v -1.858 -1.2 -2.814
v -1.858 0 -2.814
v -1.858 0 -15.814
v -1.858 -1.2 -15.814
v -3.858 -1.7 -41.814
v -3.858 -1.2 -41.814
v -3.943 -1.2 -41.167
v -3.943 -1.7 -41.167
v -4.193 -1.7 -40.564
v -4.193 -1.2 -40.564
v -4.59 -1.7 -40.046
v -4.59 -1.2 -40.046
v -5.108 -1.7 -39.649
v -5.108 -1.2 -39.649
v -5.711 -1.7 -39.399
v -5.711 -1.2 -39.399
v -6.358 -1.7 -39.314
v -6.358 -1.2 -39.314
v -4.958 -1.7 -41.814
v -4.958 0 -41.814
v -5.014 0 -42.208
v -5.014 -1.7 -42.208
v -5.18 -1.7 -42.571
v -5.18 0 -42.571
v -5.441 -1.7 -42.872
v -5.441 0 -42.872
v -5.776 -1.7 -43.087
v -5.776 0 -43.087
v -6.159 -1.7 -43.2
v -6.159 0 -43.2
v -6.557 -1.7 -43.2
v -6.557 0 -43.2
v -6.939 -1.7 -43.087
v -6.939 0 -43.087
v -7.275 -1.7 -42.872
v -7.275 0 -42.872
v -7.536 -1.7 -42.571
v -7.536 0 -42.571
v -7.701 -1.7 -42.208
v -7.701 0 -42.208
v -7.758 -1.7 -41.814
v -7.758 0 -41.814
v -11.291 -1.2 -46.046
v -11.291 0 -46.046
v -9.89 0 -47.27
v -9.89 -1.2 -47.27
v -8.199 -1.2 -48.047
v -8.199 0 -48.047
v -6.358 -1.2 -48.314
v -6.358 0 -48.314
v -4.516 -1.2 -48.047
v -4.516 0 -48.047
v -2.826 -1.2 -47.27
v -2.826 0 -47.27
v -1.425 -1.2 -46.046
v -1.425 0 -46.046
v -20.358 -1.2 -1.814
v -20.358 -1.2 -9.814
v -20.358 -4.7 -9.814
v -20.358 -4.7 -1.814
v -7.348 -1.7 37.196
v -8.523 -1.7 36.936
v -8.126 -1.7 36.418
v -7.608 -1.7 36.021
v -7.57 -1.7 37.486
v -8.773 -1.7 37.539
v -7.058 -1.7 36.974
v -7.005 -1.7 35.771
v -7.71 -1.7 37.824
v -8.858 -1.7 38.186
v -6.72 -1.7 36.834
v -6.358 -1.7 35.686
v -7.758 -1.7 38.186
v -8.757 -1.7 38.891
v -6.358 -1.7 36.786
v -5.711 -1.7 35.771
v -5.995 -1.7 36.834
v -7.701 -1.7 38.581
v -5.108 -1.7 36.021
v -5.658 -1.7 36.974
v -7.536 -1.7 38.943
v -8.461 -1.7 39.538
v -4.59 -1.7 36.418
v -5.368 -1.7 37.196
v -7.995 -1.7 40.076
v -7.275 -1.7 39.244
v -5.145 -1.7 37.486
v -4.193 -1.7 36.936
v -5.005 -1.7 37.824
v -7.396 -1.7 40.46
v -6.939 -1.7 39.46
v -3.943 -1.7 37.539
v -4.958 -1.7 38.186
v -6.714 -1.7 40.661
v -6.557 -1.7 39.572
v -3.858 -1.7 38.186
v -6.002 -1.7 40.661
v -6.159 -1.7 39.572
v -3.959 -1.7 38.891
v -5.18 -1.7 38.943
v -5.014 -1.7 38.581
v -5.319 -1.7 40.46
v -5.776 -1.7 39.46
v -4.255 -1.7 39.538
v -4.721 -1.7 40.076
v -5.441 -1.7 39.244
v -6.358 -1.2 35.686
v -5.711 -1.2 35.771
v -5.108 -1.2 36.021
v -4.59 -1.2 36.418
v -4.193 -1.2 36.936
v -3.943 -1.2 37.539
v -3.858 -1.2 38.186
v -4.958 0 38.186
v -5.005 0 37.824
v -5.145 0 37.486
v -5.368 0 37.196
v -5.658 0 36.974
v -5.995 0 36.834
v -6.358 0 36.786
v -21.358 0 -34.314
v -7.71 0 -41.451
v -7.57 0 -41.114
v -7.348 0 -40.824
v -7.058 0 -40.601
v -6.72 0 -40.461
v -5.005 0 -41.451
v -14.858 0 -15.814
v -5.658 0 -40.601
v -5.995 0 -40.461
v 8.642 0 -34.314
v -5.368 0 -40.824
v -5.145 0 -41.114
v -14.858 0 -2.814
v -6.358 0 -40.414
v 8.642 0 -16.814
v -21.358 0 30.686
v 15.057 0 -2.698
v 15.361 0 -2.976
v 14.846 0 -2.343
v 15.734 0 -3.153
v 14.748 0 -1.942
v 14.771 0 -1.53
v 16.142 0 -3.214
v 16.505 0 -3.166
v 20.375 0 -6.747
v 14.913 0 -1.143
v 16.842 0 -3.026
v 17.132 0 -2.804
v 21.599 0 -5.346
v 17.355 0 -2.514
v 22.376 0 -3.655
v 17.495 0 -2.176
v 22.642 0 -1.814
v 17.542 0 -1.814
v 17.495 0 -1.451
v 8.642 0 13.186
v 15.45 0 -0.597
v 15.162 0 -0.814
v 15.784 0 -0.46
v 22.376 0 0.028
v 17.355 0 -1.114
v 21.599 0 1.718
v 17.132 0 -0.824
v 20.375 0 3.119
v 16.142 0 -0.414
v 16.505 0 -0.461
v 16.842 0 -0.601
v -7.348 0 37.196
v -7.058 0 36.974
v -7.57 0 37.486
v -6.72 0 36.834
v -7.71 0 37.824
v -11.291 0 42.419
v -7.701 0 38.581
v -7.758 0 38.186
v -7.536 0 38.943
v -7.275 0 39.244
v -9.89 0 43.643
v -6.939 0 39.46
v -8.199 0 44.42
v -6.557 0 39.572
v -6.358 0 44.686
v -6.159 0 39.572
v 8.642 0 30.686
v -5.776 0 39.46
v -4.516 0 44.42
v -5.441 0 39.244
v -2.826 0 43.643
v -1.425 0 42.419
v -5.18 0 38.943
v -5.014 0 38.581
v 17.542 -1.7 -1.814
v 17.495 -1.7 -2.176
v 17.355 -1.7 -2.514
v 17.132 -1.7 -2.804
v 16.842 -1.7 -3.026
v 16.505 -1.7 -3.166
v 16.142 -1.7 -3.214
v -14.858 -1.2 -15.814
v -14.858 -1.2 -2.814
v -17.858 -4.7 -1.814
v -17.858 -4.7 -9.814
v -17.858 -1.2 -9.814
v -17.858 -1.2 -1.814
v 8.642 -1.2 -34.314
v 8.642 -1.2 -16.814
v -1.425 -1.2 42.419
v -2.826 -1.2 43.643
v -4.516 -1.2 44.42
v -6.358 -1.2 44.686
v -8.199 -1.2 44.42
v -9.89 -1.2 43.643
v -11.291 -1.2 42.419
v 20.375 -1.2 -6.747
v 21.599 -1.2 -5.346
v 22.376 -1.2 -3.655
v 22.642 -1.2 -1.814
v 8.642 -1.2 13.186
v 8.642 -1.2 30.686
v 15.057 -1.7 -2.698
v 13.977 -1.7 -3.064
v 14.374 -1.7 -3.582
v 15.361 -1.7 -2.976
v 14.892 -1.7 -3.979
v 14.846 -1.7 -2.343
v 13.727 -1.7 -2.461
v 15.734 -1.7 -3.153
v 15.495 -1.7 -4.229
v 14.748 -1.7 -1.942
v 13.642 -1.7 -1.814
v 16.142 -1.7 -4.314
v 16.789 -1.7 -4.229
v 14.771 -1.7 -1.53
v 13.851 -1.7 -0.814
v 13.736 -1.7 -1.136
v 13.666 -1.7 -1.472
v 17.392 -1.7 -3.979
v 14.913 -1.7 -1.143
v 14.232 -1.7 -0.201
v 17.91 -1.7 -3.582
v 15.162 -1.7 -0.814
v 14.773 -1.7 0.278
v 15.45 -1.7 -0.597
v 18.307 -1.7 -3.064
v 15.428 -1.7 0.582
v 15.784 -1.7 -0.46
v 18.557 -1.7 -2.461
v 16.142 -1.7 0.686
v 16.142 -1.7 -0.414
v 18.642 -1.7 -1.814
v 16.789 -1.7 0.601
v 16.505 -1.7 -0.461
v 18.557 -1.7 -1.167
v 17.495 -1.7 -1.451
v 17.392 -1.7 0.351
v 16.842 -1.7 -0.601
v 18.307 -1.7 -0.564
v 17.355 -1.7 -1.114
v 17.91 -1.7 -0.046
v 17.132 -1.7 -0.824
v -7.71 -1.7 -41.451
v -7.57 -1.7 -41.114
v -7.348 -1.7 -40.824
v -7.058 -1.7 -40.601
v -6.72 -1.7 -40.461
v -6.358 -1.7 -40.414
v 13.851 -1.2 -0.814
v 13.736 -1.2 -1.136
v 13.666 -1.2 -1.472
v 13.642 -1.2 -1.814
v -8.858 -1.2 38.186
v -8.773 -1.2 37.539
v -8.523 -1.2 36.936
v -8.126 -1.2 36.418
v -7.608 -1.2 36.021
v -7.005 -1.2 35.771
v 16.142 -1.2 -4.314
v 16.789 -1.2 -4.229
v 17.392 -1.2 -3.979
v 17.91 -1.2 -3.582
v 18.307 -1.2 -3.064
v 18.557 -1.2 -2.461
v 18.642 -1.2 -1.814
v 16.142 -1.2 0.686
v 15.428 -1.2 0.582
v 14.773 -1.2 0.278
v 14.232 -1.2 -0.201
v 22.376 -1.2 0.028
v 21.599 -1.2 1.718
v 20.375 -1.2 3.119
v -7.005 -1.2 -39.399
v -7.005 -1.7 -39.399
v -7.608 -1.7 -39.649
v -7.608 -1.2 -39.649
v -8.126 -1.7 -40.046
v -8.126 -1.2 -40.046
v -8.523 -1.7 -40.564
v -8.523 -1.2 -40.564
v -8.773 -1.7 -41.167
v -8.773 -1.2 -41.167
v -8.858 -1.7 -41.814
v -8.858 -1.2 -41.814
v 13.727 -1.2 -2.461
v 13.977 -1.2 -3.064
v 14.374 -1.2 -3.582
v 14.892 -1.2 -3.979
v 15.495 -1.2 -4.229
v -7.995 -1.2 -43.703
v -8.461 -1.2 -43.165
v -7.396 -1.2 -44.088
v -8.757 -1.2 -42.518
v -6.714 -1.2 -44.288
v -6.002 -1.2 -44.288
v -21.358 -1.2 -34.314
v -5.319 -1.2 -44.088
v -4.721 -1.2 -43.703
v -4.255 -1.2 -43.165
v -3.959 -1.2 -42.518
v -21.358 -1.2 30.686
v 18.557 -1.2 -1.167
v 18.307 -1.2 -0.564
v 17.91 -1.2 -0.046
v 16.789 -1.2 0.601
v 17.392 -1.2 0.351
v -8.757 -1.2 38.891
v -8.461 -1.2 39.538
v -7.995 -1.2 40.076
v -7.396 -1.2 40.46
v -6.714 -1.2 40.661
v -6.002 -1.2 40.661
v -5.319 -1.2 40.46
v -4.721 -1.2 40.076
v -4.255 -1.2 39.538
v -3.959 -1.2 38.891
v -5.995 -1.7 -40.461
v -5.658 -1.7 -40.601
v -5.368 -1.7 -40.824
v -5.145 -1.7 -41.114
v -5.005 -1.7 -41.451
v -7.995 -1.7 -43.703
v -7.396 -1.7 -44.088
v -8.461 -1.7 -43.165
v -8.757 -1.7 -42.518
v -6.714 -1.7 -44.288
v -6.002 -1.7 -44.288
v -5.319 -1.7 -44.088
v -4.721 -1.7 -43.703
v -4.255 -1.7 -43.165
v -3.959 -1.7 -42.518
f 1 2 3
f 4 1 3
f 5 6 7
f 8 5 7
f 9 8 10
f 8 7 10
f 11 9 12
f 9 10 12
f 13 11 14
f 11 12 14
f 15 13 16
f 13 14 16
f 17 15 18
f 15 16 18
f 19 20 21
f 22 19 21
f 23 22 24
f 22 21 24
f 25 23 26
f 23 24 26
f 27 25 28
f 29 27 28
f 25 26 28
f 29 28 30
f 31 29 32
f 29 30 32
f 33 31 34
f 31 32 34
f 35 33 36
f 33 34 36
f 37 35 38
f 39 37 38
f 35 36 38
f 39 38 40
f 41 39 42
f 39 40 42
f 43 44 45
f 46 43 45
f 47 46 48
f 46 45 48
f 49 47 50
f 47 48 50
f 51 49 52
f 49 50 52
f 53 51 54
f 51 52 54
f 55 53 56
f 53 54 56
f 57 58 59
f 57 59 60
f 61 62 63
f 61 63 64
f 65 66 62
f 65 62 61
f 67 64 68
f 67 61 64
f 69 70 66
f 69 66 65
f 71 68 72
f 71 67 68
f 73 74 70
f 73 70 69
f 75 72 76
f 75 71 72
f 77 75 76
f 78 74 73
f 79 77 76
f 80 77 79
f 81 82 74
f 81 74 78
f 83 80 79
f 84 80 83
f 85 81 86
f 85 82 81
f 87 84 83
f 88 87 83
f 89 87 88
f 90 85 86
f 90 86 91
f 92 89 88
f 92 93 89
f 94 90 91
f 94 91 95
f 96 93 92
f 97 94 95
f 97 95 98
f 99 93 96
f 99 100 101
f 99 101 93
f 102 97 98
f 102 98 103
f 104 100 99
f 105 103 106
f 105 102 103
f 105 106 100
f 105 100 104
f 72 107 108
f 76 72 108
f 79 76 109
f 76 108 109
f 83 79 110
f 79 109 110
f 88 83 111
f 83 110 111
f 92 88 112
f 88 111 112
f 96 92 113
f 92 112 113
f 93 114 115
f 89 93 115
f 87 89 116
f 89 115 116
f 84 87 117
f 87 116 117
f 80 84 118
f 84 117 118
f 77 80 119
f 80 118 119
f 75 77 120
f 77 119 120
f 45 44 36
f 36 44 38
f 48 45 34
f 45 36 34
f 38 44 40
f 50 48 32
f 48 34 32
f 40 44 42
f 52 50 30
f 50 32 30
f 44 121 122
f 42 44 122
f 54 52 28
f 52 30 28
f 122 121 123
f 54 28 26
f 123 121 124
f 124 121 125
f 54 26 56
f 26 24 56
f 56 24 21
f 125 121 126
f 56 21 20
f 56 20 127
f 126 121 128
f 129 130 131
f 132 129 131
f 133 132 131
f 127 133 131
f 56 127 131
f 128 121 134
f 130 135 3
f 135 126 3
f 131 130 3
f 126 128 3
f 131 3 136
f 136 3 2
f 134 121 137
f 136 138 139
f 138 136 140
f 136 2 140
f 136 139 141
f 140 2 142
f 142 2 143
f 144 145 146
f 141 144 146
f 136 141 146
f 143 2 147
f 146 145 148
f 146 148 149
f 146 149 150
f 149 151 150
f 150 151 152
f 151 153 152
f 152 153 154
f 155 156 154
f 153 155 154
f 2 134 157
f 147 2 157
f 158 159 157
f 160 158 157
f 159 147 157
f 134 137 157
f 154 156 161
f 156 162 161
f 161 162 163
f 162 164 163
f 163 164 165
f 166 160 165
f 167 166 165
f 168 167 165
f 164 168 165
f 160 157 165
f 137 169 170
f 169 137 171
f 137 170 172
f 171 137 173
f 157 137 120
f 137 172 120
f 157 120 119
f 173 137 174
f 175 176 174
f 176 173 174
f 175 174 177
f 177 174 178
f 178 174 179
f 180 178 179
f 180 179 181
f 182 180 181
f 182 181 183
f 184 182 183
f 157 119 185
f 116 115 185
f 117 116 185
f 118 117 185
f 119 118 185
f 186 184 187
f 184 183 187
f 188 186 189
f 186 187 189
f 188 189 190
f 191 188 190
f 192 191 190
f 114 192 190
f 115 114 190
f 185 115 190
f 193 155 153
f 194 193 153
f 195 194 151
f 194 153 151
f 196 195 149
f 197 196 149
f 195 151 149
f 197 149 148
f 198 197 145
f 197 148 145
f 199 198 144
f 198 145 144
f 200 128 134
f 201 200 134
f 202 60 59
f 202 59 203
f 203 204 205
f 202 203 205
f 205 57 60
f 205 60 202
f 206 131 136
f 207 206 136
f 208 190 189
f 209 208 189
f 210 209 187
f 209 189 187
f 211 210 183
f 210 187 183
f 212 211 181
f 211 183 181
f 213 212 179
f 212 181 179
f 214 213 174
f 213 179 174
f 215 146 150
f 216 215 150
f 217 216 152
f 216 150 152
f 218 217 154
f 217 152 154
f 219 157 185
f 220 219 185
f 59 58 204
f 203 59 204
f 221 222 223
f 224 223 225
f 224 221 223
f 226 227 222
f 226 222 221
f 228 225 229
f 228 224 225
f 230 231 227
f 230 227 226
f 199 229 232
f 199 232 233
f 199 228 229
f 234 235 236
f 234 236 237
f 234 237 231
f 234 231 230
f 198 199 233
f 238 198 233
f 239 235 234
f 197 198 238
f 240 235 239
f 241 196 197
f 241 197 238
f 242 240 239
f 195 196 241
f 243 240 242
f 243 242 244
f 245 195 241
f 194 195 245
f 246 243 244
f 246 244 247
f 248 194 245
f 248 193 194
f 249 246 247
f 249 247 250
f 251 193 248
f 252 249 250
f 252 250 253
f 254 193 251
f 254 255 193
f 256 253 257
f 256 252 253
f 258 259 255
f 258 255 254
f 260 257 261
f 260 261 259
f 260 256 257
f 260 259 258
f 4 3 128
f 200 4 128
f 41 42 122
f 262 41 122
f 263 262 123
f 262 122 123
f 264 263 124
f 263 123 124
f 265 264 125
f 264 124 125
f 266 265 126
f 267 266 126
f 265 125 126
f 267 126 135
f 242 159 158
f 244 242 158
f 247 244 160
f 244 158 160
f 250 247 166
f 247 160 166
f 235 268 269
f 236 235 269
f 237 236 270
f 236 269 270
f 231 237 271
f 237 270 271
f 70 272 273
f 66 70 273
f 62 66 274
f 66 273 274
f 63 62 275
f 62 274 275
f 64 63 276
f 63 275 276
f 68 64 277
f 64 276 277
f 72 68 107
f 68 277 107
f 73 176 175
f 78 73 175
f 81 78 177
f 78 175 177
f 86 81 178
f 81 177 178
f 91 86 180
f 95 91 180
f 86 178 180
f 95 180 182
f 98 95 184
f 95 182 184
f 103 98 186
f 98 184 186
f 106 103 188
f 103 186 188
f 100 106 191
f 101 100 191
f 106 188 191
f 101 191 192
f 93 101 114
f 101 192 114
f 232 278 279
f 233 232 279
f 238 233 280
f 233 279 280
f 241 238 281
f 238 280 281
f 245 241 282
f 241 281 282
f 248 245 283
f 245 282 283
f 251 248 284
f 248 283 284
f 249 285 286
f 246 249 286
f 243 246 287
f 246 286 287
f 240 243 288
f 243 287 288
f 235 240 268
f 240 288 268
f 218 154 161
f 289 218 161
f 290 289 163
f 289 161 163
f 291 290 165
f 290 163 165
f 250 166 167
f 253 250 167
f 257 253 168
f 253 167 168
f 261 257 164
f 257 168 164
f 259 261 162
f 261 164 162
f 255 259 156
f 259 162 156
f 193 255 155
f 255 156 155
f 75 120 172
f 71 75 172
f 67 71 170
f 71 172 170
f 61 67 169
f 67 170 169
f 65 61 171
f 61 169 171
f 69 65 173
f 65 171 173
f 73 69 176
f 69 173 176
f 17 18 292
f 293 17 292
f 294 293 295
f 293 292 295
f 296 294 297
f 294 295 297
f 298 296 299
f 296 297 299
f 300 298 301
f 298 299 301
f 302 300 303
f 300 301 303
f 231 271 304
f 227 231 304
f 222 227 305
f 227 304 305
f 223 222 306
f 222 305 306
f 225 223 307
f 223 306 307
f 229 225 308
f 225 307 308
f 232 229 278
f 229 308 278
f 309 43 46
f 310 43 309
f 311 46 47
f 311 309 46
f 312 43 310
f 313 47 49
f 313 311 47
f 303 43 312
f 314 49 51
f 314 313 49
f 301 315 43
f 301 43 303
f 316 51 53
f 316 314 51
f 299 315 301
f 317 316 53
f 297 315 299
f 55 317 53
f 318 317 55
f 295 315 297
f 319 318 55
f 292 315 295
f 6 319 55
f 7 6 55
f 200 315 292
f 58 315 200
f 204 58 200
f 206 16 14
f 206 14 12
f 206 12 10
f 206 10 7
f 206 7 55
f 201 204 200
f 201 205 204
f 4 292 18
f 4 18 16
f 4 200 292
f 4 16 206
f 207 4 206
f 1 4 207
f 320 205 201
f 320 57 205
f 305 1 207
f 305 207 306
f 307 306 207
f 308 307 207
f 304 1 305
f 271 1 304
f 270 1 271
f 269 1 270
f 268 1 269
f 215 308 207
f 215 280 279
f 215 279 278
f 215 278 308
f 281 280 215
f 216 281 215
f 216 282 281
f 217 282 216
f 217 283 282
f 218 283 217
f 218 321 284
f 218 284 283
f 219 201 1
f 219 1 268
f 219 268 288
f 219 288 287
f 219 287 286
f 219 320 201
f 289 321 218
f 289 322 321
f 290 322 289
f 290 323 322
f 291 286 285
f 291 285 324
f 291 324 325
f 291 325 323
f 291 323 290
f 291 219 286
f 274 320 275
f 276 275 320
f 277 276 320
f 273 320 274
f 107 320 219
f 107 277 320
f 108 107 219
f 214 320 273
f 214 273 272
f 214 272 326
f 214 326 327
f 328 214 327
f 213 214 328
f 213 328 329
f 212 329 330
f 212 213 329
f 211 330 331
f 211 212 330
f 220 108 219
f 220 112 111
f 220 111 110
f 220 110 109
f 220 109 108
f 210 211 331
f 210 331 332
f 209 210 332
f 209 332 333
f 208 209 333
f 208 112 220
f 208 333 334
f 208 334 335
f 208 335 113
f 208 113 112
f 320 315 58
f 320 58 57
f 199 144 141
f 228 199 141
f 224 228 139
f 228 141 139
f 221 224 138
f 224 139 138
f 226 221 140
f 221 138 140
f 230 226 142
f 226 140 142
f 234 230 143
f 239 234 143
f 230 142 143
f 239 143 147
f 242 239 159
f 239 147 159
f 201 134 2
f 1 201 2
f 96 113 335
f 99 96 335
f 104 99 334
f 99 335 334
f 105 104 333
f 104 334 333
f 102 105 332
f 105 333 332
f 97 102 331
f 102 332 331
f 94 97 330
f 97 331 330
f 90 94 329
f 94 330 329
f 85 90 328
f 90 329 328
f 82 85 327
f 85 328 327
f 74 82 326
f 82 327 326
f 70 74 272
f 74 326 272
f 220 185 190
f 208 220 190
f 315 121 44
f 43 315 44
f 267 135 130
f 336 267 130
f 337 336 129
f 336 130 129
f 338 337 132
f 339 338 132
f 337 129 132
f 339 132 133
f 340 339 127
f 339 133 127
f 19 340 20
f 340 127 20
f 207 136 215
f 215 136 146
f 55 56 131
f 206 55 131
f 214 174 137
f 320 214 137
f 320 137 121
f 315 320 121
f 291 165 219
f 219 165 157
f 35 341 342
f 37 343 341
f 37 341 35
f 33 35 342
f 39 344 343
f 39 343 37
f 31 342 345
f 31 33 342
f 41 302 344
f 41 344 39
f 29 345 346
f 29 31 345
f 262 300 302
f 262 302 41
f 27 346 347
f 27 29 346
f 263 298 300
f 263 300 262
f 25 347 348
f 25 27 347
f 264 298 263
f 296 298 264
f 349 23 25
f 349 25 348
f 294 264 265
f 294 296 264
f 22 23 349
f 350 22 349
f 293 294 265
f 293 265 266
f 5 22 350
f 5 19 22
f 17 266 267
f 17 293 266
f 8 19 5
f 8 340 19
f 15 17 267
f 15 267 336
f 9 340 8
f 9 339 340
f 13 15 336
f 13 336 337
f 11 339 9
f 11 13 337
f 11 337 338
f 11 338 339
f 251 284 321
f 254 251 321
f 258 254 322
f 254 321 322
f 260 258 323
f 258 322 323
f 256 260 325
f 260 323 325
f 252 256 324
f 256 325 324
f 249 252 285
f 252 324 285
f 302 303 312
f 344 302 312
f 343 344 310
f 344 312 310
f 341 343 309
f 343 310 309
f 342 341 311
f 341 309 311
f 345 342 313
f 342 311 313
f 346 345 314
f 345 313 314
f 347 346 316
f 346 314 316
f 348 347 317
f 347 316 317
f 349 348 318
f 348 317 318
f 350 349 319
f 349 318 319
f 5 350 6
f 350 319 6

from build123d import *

# Parameters (mm, degrees)
F1_DEPTH = 1.2
F2_DEPTH = 1.7
F0_W     = 2.5
F0_H     = 8
F3_DEPTH = 4.7


with BuildPart() as f1:
    # F0 (on Front) → F1 (new body)
    with BuildSketch(Plane.XZ):
        Polygon((-6.3577895987, -1.8137509867), (-6.3577895987, 30.6862490133), (-12.8577895987, 30.6862490133), (-21.3577895987, 30.6862490133), (-21.3577895987, -1.8137509867), (-20.3577895987, -1.8137509867), (-17.8577895987, -1.8137509867), align=None)
        Polygon((0.1422104013, 30.6862490133), (-6.3577895987, 30.6862490133), (-6.3577895987, -1.8137509867), (8.6422104013, -1.8137509867), (8.6422104013, -0.8137509867), (8.6422104013, 4.6862490133), (8.6422104013, 13.1862490133), (8.6422104013, 30.6862490133), align=None)
        with BuildLine():
            Line((-21.3577895987, 30.6862490133), (-12.8577895987, 30.6862490133))
            Line((-12.8577895987, 30.6862490133), (-12.8577895987, 38.1862490133))
            ThreePointArc((-12.8577895987, 38.1862490133), (-12.4534647314, 40.4429600442), (-11.2907912366, 42.4189189557))
            Line((-11.2907912366, 42.4189189557), (-21.3577895987, 30.6862490133))
        make_face()
        with BuildLine():
            Line((0.1422104013, 38.1862490133), (0.1422104013, 30.6862490133))
            Line((0.1422104013, 30.6862490133), (8.6422104013, 30.6862490133))
            Line((8.6422104013, 30.6862490133), (-1.4247879609, 42.4189189557))
            ThreePointArc((-1.4247879609, 42.4189189557), (-0.2621144661, 40.4429600442), (0.1422104013, 38.1862490133))
        make_face()
        Polygon((8.6422104013, -1.8137509867), (-6.3577895987, -1.8137509867), (-6.3577895987, -2.8137509867), (-1.8577895987, -2.8137509867), (-1.8577895987, -15.8137509867), (-6.3577895987, -15.8137509867), (-6.3577895987, -34.3137509867), (0.1422104013, -34.3137509867), (8.6422104013, -34.3137509867), (8.6422104013, -16.8137509867), (8.6422104013, -8.3137509867), align=None)
        Polygon((-6.3577895987, -2.8137509867), (-6.3577895987, -1.8137509867), (-17.8577895987, -1.8137509867), (-17.8577895987, -9.8137509867), (-20.3577895987, -9.8137509867), (-20.3577895987, -1.8137509867), (-21.3577895987, -1.8137509867), (-21.3577895987, -34.3137509867), (-12.8577895987, -34.3137509867), (-6.3577895987, -34.3137509867), (-6.3577895987, -15.8137509867), (-14.8577895987, -15.8137509867), (-14.8577895987, -2.8137509867), align=None)
        with BuildLine():
            ThreePointArc((-11.2907912366, 42.4189189557), (-12.4534647314, 40.4429600442), (-12.8577895987, 38.1862490133))
            Line((-12.8577895987, 38.1862490133), (-8.8577895987, 38.1862490133))
            ThreePointArc((-8.8577895987, 38.1862490133), (-6.3577895987, 40.6862490133), (-3.8577895987, 38.1862490133))
            Line((-3.8577895987, 38.1862490133), (0.1422104013, 38.1862490133))
            ThreePointArc((0.1422104013, 38.1862490133), (-0.2621144661, 40.4429600442), (-1.4247879609, 42.4189189557))
            ThreePointArc((-1.4247879609, 42.4189189557), (-6.3577895987, 44.6862490133), (-11.2907912366, 42.4189189557))
        make_face()
        with BuildLine():
            Line((20.3748803436, 3.1192506512), (8.6422104013, 13.1862490133))
            Line((8.6422104013, 13.1862490133), (8.6422104013, 4.6862490133))
            Line((8.6422104013, 4.6862490133), (16.1422104013, 4.6862490133))
            ThreePointArc((16.1422104013, 4.6862490133), (18.3989214322, 4.281924146), (20.3748803436, 3.1192506512))
        make_face()
        with BuildLine():
            Line((16.1422104013, -8.3137509867), (8.6422104013, -8.3137509867))
            Line((8.6422104013, -8.3137509867), (8.6422104013, -16.8137509867))
            Line((8.6422104013, -16.8137509867), (20.3748803436, -6.7467526245))
            ThreePointArc((20.3748803436, -6.7467526245), (18.3989214322, -7.9094261194), (16.1422104013, -8.3137509867))
        make_face()
        with BuildLine():
            Line((-12.8577895987, -34.3137509867), (-21.3577895987, -34.3137509867))
            Line((-21.3577895987, -34.3137509867), (-11.290791296, -46.0464208599))
            ThreePointArc((-11.290791296, -46.0464208599), (-12.4534647472, -44.0704619748), (-12.8577895987, -41.8137509867))
            Line((-12.8577895987, -41.8137509867), (-12.8577895987, -34.3137509867))
        make_face()
        with BuildLine():
            ThreePointArc((22.6422104013, -1.8137509867), (22.0482392966, 0.9008065624), (20.3748803436, 3.1192506512))
            ThreePointArc((20.3748803436, 3.1192506512), (18.3989214322, 4.281924146), (16.1422104013, 4.6862490133))
            Line((16.1422104013, 4.6862490133), (16.1422104013, 0.6862490133))
            ThreePointArc((16.1422104013, 0.6862490133), (17.9099773542, -0.0459840337), (18.6422104013, -1.8137509867))
            ThreePointArc((18.6422104013, -1.8137509867), (17.9099773542, -3.5815179397), (16.1422104013, -4.3137509867))
            Line((16.1422104013, -4.3137509867), (16.1422104013, -8.3137509867))
            ThreePointArc((16.1422104013, -8.3137509867), (18.3989214322, -7.9094261194), (20.3748803436, -6.7467526245))
            ThreePointArc((20.3748803436, -6.7467526245), (22.0482392966, -4.5283085358), (22.6422104013, -1.8137509867))
        make_face()
        with BuildLine():
            ThreePointArc((-12.8577895987, -41.8137509867), (-12.4534647472, -44.0704619748), (-11.290791296, -46.0464208599))
            ThreePointArc((-11.290791296, -46.0464208599), (-6.3577896443, -48.3137509867), (-1.4247879609, -46.0464209291))
            ThreePointArc((-1.4247879609, -46.0464209291), (-0.2621144661, -44.0704620176), (0.1422104013, -41.8137509867))
            Line((0.1422104013, -41.8137509867), (-3.8577895987, -41.8137509867))
            ThreePointArc((-3.8577895987, -41.8137509867), (-6.3577895987, -44.3137509867), (-8.8577895987, -41.8137509867))
            Line((-8.8577895987, -41.8137509867), (-12.8577895987, -41.8137509867))
        make_face()
        with BuildLine():
            Line((8.6422104013, -34.3137509867), (0.1422104013, -34.3137509867))
            Line((0.1422104013, -34.3137509867), (0.1422104013, -41.8137509867))
            ThreePointArc((0.1422104013, -41.8137509867), (-0.2621144661, -44.0704620176), (-1.4247879609, -46.0464209291))
            Line((-1.4247879609, -46.0464209291), (8.6422104013, -34.3137509867))
        make_face()
        with BuildLine():
            ThreePointArc((-12.8577895987, 38.1862490133), (-10.9539836765, 33.5900549356), (-6.3577895987, 31.6862490133))
            Line((-6.3577895987, 31.6862490133), (-6.3577895987, 35.6862490133))
            ThreePointArc((-6.3577895987, 35.6862490133), (-8.1255565517, 36.4184820603), (-8.8577895987, 38.1862490133))
            Line((-8.8577895987, 38.1862490133), (-12.8577895987, 38.1862490133))
        make_face()
        with BuildLine():
            Line((-12.8577895987, 30.6862490133), (-6.3577895987, 30.6862490133))
            Line((-6.3577895987, 30.6862490133), (-6.3577895987, 31.6862490133))
            ThreePointArc((-6.3577895987, 31.6862490133), (-10.9539836765, 33.5900549356), (-12.8577895987, 38.1862490133))
            Line((-12.8577895987, 38.1862490133), (-12.8577895987, 30.6862490133))
        make_face()
        with BuildLine():
            Line((13.6422104013, -1.8137509867), (9.6422104013, -1.8137509867))
            ThreePointArc((9.6422104013, -1.8137509867), (11.5460163235, -6.4099450644), (16.1422104013, -8.3137509867))
            Line((16.1422104013, -8.3137509867), (16.1422104013, -4.3137509867))
            ThreePointArc((16.1422104013, -4.3137509867), (14.3744434483, -3.5815179397), (13.6422104013, -1.8137509867))
        make_face()
        with BuildLine():
            Line((8.6422104013, 4.6862490133), (8.6422104013, -0.8137509867))
            Line((8.6422104013, -0.8137509867), (9.7195941119, -0.8137509867))
            ThreePointArc((9.7195941119, -0.8137509867), (11.9143267699, 3.1233534278), (16.1422104013, 4.6862490133))
            Line((16.1422104013, 4.6862490133), (8.6422104013, 4.6862490133))
        make_face()
        with BuildLine():
            Line((0.1422104013, -34.3137509867), (-6.3577895987, -34.3137509867))
            Line((-6.3577895987, -34.3137509867), (-6.3577895987, -35.3137509867))
            ThreePointArc((-6.3577895987, -35.3137509867), (-1.761595521, -37.217556909), (0.1422104013, -41.8137509867))
            Line((0.1422104013, -41.8137509867), (0.1422104013, -34.3137509867))
        make_face()
        with BuildLine():
            Line((-6.3577895987, -35.3137509867), (-6.3577895987, -34.3137509867))
            Line((-6.3577895987, -34.3137509867), (-12.8577895987, -34.3137509867))
            Line((-12.8577895987, -34.3137509867), (-12.8577895987, -41.8137509867))
            ThreePointArc((-12.8577895987, -41.8137509867), (-10.9539836765, -37.217556909), (-6.3577895987, -35.3137509867))
        make_face()
        with BuildLine():
            Line((-6.3577895987, -39.3137509867), (-6.3577895987, -35.3137509867))
            ThreePointArc((-6.3577895987, -35.3137509867), (-10.9539836765, -37.217556909), (-12.8577895987, -41.8137509867))
            Line((-12.8577895987, -41.8137509867), (-8.8577895987, -41.8137509867))
            ThreePointArc((-8.8577895987, -41.8137509867), (-8.1255565517, -40.0459840337), (-6.3577895987, -39.3137509867))
        make_face()
        with BuildLine():
            ThreePointArc((0.1422104013, -41.8137509867), (-1.761595521, -37.217556909), (-6.3577895987, -35.3137509867))
            Line((-6.3577895987, -35.3137509867), (-6.3577895987, -39.3137509867))
            ThreePointArc((-6.3577895987, -39.3137509867), (-4.5900226458, -40.0459840337), (-3.8577895987, -41.8137509867))
            Line((-3.8577895987, -41.8137509867), (0.1422104013, -41.8137509867))
        make_face()
        with BuildLine():
            Line((-6.3577895987, 31.6862490133), (-6.3577895987, 30.6862490133))
            Line((-6.3577895987, 30.6862490133), (0.1422104013, 30.6862490133))
            Line((0.1422104013, 30.6862490133), (0.1422104013, 38.1862490133))
            ThreePointArc((0.1422104013, 38.1862490133), (-1.761595521, 33.5900549356), (-6.3577895987, 31.6862490133))
        make_face()
        with BuildLine():
            Line((-6.3577895987, 35.6862490133), (-6.3577895987, 31.6862490133))
            ThreePointArc((-6.3577895987, 31.6862490133), (-1.761595521, 33.5900549356), (0.1422104013, 38.1862490133))
            Line((0.1422104013, 38.1862490133), (-3.8577895987, 38.1862490133))
            ThreePointArc((-3.8577895987, 38.1862490133), (-4.5900226458, 36.4184820603), (-6.3577895987, 35.6862490133))
        make_face()
        with BuildLine():
            Line((9.6422104013, -1.8137509867), (8.6422104013, -1.8137509867))
            Line((8.6422104013, -1.8137509867), (8.6422104013, -8.3137509867))
            Line((8.6422104013, -8.3137509867), (16.1422104013, -8.3137509867))
            ThreePointArc((16.1422104013, -8.3137509867), (11.5460163235, -6.4099450644), (9.6422104013, -1.8137509867))
        make_face()
        with BuildLine():
            ThreePointArc((16.1422104013, 4.6862490133), (11.9143267699, 3.1233534278), (9.7195941119, -0.8137509867))
            Line((9.7195941119, -0.8137509867), (13.8509225538, -0.8137509867))
            ThreePointArc((13.8509225538, -0.8137509867), (14.7729040075, 0.2778990796), (16.1422104013, 0.6862490133))
            Line((16.1422104013, 0.6862490133), (16.1422104013, 4.6862490133))
        make_face()
        with BuildLine():
            ThreePointArc((9.7195941119, -0.8137509867), (9.6615852045, -1.3122561615), (9.6422104013, -1.8137509867))
            Line((9.6422104013, -1.8137509867), (13.6422104013, -1.8137509867))
            ThreePointArc((13.6422104013, -1.8137509867), (13.6949446189, -1.3029768775), (13.8509225538, -0.8137509867))
            Line((13.8509225538, -0.8137509867), (9.7195941119, -0.8137509867))
        make_face()
        with BuildLine():
            Line((8.6422104013, -0.8137509867), (8.6422104013, -1.8137509867))
            Line((8.6422104013, -1.8137509867), (9.6422104013, -1.8137509867))
            ThreePointArc((9.6422104013, -1.8137509867), (9.6615852045, -1.3122561615), (9.7195941119, -0.8137509867))
            Line((9.7195941119, -0.8137509867), (8.6422104013, -0.8137509867))
        make_face()
    extrude(amount=F1_DEPTH)

    # F0 (on Front) → F2 (join)
    with BuildSketch(Plane.XZ):
        with BuildLine():
            Line((-6.3577895987, 36.7862490133), (-6.3577895987, 35.6862490133))
            ThreePointArc((-6.3577895987, 35.6862490133), (-4.5900226458, 36.4184820603), (-3.8577895987, 38.1862490133))
            Line((-3.8577895987, 38.1862490133), (-4.9577895987, 38.1862490133))
            ThreePointArc((-4.9577895987, 38.1862490133), (-5.3678401051, 37.1962995197), (-6.3577895987, 36.7862490133))
        make_face()
        with BuildLine():
            ThreePointArc((-3.8577895987, 38.1862490133), (-6.3577895987, 40.6862490133), (-8.8577895987, 38.1862490133))
            Line((-8.8577895987, 38.1862490133), (-7.7577895987, 38.1862490133))
            ThreePointArc((-7.7577895987, 38.1862490133), (-6.3577895987, 39.5862490133), (-4.9577895987, 38.1862490133))
            Line((-4.9577895987, 38.1862490133), (-3.8577895987, 38.1862490133))
        make_face()
        with BuildLine():
            ThreePointArc((-8.8577895987, 38.1862490133), (-8.1255565517, 36.4184820603), (-6.3577895987, 35.6862490133))
            Line((-6.3577895987, 35.6862490133), (-6.3577895987, 36.7862490133))
            ThreePointArc((-6.3577895987, 36.7862490133), (-7.3477390924, 37.1962995197), (-7.7577895987, 38.1862490133))
            Line((-7.7577895987, 38.1862490133), (-8.8577895987, 38.1862490133))
        make_face()
        with BuildLine():
            Line((14.7422104013, -1.8137509867), (13.6422104013, -1.8137509867))
            ThreePointArc((13.6422104013, -1.8137509867), (14.3744434483, -3.5815179397), (16.1422104013, -4.3137509867))
            Line((16.1422104013, -4.3137509867), (16.1422104013, -3.2137509867))
            ThreePointArc((16.1422104013, -3.2137509867), (15.1522609076, -2.8037004803), (14.7422104013, -1.8137509867))
        make_face()
        with BuildLine():
            Line((16.1422104013, -3.2137509867), (16.1422104013, -4.3137509867))
            ThreePointArc((16.1422104013, -4.3137509867), (17.9099773542, -3.5815179397), (18.6422104013, -1.8137509867))
            ThreePointArc((18.6422104013, -1.8137509867), (17.9099773542, -0.0459840337), (16.1422104013, 0.6862490133))
            Line((16.1422104013, 0.6862490133), (16.1422104013, -0.4137509867))
            ThreePointArc((16.1422104013, -0.4137509867), (17.1321598949, -0.823801493), (17.5422104013, -1.8137509867))
            ThreePointArc((17.5422104013, -1.8137509867), (17.1321598949, -2.8037004803), (16.1422104013, -3.2137509867))
        make_face()
        with BuildLine():
            Line((-7.7577895987, -41.8137509867), (-8.8577895987, -41.8137509867))
            ThreePointArc((-8.8577895987, -41.8137509867), (-6.3577895987, -44.3137509867), (-3.8577895987, -41.8137509867))
            Line((-3.8577895987, -41.8137509867), (-4.9577895987, -41.8137509867))
            ThreePointArc((-4.9577895987, -41.8137509867), (-6.3577895987, -43.2137509867), (-7.7577895987, -41.8137509867))
        make_face()
        with BuildLine():
            Line((-6.3577895987, -40.4137509867), (-6.3577895987, -39.3137509867))
            ThreePointArc((-6.3577895987, -39.3137509867), (-8.1255565517, -40.0459840337), (-8.8577895987, -41.8137509867))
            Line((-8.8577895987, -41.8137509867), (-7.7577895987, -41.8137509867))
            ThreePointArc((-7.7577895987, -41.8137509867), (-7.3477390924, -40.823801493), (-6.3577895987, -40.4137509867))
        make_face()
        with BuildLine():
            ThreePointArc((-3.8577895987, -41.8137509867), (-4.5900226458, -40.0459840337), (-6.3577895987, -39.3137509867))
            Line((-6.3577895987, -39.3137509867), (-6.3577895987, -40.4137509867))
            ThreePointArc((-6.3577895987, -40.4137509867), (-5.3678401051, -40.823801493), (-4.9577895987, -41.8137509867))
            Line((-4.9577895987, -41.8137509867), (-3.8577895987, -41.8137509867))
        make_face()
        with BuildLine():
            ThreePointArc((16.1422104013, 0.6862490133), (14.7729040075, 0.2778990796), (13.8509225538, -0.8137509867))
            Line((13.8509225538, -0.8137509867), (15.1624145041, -0.8137509867))
            ThreePointArc((15.1624145041, -0.8137509867), (15.613060139, -0.517602847), (16.1422104013, -0.4137509867))
            Line((16.1422104013, -0.4137509867), (16.1422104013, 0.6862490133))
        make_face()
        with BuildLine():
            ThreePointArc((13.8509225538, -0.8137509867), (13.6949446189, -1.3029768775), (13.6422104013, -1.8137509867))
            Line((13.6422104013, -1.8137509867), (14.7422104013, -1.8137509867))
            ThreePointArc((14.7422104013, -1.8137509867), (14.8515295236, -1.2714015864), (15.1624145041, -0.8137509867))
            Line((15.1624145041, -0.8137509867), (13.8509225538, -0.8137509867))
        make_face()
    extrude(amount=F2_DEPTH)

    # F0 (on Front) → F3 (join)
    with BuildSketch(Plane.XZ):
        with Locations((-19.1077895987, -5.8137509867)):
            Rectangle(F0_W, F0_H)
    extrude(amount=F3_DEPTH)


solid = f1.part
